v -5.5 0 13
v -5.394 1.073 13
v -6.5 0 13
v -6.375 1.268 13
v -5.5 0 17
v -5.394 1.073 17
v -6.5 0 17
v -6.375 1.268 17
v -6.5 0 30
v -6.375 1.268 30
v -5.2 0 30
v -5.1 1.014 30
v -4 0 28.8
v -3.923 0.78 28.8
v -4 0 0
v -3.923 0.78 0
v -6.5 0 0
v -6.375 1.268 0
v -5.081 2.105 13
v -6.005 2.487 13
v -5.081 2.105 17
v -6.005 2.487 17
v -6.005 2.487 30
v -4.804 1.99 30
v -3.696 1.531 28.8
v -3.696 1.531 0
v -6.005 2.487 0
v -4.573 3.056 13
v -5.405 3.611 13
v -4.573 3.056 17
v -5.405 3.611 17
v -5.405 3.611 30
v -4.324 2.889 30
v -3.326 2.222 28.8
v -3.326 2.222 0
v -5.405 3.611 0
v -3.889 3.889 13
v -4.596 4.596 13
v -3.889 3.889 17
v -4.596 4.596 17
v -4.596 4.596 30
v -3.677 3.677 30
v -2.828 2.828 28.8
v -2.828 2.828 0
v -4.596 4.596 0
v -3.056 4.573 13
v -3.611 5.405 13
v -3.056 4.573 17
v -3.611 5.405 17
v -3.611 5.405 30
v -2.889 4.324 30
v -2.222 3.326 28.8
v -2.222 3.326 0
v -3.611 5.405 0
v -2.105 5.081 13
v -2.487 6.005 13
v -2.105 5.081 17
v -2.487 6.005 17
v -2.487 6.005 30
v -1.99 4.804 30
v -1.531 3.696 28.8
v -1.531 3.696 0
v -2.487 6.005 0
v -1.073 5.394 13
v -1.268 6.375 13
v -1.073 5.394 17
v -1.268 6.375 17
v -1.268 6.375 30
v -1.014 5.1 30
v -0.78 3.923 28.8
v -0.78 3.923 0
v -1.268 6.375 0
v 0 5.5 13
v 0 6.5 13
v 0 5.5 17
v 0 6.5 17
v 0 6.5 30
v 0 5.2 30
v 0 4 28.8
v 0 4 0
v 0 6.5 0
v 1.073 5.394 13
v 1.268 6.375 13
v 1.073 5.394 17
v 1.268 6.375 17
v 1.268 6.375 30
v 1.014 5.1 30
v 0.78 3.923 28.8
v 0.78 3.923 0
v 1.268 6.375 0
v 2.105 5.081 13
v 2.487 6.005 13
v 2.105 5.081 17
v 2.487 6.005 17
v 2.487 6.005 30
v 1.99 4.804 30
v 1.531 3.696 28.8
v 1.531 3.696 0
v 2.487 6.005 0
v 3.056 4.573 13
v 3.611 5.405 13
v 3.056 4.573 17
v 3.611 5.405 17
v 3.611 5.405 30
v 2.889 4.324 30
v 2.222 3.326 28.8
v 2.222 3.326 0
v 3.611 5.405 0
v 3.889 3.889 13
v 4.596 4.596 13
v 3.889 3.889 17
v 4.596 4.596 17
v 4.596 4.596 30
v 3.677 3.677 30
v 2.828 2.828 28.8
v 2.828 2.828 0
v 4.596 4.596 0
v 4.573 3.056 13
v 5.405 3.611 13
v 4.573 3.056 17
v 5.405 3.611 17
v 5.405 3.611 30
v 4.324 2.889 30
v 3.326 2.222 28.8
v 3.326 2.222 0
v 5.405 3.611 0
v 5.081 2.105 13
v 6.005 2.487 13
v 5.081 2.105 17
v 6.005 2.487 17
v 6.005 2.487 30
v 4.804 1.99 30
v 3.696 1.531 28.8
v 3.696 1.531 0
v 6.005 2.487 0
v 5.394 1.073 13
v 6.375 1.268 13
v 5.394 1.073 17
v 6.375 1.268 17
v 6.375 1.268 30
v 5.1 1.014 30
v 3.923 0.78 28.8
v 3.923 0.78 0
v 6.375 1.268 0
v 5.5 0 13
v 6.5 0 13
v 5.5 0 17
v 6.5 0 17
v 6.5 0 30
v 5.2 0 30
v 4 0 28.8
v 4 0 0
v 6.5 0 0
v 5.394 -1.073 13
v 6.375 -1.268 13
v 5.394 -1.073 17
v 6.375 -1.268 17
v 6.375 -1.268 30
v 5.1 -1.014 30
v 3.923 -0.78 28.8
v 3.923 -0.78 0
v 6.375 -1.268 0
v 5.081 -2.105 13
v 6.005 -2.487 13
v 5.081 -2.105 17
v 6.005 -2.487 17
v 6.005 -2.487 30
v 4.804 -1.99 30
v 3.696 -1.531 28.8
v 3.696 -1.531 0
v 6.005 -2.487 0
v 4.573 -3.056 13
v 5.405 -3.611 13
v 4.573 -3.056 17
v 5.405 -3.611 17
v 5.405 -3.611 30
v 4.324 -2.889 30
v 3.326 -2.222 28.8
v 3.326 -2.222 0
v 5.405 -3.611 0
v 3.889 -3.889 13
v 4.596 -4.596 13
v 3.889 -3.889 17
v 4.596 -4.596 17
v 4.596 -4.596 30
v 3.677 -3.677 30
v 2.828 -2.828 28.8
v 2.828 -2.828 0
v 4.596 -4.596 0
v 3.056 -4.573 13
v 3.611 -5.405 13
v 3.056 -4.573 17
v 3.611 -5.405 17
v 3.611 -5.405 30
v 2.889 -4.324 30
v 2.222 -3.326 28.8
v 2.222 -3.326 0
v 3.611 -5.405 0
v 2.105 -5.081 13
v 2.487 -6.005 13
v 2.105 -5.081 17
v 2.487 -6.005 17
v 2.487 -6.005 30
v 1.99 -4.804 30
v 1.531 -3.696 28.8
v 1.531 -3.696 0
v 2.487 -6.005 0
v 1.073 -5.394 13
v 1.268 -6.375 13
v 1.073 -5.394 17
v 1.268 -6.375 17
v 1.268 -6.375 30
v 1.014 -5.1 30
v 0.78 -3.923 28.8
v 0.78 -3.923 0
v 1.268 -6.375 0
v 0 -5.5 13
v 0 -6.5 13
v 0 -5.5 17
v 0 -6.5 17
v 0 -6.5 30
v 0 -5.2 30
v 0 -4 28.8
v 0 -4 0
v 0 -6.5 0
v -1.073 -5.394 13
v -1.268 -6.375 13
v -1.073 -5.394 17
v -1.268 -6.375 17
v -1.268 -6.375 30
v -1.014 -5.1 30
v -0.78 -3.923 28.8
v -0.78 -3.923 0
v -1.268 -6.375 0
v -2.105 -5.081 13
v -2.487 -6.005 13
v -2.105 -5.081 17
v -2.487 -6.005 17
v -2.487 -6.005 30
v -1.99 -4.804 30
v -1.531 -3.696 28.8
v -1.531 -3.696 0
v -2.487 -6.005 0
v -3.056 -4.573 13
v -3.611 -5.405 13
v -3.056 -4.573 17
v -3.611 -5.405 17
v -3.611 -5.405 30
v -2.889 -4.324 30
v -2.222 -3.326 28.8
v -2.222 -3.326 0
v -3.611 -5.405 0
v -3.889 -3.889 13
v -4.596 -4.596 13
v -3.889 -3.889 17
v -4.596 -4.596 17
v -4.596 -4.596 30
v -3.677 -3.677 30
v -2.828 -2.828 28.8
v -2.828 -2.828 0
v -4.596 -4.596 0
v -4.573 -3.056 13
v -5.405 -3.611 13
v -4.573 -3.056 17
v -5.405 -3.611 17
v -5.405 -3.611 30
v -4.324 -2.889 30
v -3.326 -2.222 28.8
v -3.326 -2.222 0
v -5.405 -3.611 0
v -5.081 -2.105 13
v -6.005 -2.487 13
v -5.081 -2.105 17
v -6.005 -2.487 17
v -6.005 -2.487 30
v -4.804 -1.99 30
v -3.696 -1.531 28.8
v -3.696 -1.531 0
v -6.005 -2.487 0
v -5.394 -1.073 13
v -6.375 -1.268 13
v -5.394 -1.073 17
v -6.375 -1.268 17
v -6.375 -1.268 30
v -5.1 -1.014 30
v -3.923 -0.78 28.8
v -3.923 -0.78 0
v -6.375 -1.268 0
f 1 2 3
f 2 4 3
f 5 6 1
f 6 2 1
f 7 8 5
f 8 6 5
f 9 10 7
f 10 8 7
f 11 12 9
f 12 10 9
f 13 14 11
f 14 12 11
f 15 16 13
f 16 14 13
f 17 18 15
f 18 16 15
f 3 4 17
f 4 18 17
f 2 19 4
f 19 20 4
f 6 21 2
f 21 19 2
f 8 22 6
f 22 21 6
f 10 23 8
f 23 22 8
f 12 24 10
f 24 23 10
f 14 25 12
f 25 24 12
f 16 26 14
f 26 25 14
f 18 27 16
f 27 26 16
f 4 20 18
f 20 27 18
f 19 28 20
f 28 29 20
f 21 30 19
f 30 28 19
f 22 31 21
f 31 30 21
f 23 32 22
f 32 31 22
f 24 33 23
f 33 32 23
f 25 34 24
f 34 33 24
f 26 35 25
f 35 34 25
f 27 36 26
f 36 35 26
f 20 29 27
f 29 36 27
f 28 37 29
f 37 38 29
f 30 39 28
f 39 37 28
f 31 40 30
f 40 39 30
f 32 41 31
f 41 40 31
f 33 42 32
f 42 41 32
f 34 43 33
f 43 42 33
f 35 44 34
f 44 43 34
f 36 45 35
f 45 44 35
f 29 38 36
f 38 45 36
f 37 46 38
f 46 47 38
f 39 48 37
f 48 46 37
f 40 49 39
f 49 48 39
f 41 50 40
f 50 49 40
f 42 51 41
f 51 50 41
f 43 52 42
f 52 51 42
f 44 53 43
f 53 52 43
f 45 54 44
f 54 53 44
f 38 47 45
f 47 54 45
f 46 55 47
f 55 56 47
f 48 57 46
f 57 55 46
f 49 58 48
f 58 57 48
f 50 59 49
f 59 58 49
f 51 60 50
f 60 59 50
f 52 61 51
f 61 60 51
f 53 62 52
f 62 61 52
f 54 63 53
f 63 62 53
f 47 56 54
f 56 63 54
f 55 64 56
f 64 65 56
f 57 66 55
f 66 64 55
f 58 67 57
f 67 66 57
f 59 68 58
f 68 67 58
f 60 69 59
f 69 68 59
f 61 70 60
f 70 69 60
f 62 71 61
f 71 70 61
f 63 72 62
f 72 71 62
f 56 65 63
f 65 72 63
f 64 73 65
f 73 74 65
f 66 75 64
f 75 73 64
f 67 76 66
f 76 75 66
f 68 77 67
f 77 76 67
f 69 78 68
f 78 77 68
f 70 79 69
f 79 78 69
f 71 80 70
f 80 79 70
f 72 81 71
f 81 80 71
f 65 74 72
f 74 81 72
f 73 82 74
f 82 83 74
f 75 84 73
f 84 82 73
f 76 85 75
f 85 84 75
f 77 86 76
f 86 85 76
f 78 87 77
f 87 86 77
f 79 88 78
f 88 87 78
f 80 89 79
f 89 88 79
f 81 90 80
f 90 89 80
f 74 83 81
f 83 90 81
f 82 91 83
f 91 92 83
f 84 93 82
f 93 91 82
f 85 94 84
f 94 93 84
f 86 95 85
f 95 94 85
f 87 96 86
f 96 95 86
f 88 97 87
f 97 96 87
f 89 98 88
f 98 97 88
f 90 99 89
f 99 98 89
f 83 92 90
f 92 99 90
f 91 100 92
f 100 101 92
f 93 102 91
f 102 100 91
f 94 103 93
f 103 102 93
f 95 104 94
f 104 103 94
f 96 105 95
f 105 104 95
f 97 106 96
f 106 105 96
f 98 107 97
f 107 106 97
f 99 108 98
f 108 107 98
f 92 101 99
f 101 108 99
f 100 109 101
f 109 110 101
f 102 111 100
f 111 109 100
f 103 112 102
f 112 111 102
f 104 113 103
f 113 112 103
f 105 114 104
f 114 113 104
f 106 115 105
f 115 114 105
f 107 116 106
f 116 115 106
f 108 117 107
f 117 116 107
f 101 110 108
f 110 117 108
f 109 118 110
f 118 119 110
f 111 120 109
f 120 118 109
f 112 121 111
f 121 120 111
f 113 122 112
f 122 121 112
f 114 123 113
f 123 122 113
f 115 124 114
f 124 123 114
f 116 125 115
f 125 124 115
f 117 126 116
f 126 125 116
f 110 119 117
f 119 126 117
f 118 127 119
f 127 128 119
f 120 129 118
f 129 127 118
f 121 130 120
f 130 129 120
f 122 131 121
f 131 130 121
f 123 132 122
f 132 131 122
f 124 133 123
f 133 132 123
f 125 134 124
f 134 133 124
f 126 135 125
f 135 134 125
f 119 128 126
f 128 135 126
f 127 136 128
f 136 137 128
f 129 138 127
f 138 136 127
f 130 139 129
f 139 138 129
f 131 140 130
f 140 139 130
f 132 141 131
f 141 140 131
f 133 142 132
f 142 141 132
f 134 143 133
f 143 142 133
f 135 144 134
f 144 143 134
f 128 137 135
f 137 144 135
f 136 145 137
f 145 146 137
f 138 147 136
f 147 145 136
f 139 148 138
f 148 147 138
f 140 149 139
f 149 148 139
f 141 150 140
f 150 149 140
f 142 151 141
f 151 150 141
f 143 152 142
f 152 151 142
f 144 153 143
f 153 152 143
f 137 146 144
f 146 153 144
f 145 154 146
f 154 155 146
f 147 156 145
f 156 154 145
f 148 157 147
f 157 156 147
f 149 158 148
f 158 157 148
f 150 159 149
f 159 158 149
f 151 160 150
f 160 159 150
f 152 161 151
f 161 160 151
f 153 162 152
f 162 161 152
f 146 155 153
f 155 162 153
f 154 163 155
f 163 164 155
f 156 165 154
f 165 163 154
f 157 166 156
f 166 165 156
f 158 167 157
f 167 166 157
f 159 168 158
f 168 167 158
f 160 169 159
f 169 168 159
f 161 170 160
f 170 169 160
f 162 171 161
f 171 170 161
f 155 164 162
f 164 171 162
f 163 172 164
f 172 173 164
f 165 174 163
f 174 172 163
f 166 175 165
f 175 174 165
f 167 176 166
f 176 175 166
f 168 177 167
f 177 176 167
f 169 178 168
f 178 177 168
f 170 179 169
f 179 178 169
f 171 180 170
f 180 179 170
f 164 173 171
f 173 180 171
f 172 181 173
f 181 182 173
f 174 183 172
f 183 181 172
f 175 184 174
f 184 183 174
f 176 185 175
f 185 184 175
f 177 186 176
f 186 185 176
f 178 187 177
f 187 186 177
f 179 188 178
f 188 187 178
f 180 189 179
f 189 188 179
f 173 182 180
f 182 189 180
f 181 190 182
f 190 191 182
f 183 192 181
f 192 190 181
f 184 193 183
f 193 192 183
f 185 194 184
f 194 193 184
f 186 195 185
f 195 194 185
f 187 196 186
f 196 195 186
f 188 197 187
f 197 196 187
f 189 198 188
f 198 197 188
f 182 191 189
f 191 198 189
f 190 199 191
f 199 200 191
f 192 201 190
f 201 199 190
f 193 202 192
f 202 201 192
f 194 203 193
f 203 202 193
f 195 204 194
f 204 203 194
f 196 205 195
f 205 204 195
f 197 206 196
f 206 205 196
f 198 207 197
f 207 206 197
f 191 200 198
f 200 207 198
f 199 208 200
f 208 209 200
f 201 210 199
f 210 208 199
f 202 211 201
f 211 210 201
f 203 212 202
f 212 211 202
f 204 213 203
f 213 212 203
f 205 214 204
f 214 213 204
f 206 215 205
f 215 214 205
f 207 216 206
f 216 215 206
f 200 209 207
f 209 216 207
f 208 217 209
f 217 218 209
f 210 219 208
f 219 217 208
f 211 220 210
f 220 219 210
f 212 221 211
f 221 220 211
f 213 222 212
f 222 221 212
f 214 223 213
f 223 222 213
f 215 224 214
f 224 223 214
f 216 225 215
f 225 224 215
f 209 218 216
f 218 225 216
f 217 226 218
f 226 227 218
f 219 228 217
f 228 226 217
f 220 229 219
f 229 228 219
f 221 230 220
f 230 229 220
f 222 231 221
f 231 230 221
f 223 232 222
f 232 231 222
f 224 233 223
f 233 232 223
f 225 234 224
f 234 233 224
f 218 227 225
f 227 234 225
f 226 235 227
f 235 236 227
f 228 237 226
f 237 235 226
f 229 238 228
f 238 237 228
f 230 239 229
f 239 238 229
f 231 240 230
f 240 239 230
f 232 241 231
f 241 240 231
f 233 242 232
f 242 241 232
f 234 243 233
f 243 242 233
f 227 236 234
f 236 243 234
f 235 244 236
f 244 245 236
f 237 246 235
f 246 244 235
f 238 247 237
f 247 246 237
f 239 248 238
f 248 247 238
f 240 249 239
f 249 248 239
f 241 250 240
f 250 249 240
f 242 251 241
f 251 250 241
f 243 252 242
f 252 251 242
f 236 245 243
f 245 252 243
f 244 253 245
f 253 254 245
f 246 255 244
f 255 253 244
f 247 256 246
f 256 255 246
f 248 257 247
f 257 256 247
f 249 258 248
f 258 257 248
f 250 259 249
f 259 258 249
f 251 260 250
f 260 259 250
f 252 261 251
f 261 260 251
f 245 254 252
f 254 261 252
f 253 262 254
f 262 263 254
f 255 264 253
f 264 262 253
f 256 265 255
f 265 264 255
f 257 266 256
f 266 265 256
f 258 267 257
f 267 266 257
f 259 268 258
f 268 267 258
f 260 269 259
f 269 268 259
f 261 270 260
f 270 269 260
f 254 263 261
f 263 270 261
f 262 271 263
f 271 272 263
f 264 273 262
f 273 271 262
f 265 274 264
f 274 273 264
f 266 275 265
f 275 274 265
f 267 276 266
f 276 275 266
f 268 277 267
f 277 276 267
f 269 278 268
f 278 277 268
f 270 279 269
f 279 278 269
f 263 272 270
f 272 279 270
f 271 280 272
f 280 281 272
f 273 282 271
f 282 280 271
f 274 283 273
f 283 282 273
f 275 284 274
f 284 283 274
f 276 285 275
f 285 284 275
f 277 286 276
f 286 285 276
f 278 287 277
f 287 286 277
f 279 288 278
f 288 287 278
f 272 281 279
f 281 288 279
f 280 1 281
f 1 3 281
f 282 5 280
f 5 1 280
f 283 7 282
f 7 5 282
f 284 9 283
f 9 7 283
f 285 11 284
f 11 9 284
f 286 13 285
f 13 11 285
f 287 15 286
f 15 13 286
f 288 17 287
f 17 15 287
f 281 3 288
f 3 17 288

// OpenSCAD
$fn = 32;

// ----------------------------------------------------------------------
// Grooved revolve: thread_relief, bore R4
// ----------------------------------------------------------------------

// --- parameters (mm) ---
bore_r = 4;               // bore radius
outer_r = 6.5;            // outer radius of the body
total_h = 30;             // overall height, Z
wall = 2.5;               // radial wall thickness
groove_w = 4;             // groove width
groove_d = 1;             // groove depth
grooves = 1;              // number of outer grooves
relief = 1.2;             // thread relief leg at the bore mouth
relief_angle = 45;        // thread relief chamfer angle, degrees
fit_tol = 0.1;            // declared fit tolerance (prompt contract)
free_tol = 0.5;           // declared free tolerance (prompt contract)

bbox_x = 2 * outer_r;  // full diameter
bore_d = 2 * bore_r;  // bore diameter
body_d = 2 * outer_r;  // body diameter
revolve_angle = 360;  // full turn around the Z axis

profile = [[4, 0], [6.5, 0], [6.5, 13], [5.5, 13], [5.5, 17], [6.5, 17], [6.5, 30], [5.2, 30], [4, 28.8]];  // primary outline, 9 points, counter clockwise

// --- the one profile operation ---
rotate_extrude(angle = revolve_angle) polygon(points = profile);
